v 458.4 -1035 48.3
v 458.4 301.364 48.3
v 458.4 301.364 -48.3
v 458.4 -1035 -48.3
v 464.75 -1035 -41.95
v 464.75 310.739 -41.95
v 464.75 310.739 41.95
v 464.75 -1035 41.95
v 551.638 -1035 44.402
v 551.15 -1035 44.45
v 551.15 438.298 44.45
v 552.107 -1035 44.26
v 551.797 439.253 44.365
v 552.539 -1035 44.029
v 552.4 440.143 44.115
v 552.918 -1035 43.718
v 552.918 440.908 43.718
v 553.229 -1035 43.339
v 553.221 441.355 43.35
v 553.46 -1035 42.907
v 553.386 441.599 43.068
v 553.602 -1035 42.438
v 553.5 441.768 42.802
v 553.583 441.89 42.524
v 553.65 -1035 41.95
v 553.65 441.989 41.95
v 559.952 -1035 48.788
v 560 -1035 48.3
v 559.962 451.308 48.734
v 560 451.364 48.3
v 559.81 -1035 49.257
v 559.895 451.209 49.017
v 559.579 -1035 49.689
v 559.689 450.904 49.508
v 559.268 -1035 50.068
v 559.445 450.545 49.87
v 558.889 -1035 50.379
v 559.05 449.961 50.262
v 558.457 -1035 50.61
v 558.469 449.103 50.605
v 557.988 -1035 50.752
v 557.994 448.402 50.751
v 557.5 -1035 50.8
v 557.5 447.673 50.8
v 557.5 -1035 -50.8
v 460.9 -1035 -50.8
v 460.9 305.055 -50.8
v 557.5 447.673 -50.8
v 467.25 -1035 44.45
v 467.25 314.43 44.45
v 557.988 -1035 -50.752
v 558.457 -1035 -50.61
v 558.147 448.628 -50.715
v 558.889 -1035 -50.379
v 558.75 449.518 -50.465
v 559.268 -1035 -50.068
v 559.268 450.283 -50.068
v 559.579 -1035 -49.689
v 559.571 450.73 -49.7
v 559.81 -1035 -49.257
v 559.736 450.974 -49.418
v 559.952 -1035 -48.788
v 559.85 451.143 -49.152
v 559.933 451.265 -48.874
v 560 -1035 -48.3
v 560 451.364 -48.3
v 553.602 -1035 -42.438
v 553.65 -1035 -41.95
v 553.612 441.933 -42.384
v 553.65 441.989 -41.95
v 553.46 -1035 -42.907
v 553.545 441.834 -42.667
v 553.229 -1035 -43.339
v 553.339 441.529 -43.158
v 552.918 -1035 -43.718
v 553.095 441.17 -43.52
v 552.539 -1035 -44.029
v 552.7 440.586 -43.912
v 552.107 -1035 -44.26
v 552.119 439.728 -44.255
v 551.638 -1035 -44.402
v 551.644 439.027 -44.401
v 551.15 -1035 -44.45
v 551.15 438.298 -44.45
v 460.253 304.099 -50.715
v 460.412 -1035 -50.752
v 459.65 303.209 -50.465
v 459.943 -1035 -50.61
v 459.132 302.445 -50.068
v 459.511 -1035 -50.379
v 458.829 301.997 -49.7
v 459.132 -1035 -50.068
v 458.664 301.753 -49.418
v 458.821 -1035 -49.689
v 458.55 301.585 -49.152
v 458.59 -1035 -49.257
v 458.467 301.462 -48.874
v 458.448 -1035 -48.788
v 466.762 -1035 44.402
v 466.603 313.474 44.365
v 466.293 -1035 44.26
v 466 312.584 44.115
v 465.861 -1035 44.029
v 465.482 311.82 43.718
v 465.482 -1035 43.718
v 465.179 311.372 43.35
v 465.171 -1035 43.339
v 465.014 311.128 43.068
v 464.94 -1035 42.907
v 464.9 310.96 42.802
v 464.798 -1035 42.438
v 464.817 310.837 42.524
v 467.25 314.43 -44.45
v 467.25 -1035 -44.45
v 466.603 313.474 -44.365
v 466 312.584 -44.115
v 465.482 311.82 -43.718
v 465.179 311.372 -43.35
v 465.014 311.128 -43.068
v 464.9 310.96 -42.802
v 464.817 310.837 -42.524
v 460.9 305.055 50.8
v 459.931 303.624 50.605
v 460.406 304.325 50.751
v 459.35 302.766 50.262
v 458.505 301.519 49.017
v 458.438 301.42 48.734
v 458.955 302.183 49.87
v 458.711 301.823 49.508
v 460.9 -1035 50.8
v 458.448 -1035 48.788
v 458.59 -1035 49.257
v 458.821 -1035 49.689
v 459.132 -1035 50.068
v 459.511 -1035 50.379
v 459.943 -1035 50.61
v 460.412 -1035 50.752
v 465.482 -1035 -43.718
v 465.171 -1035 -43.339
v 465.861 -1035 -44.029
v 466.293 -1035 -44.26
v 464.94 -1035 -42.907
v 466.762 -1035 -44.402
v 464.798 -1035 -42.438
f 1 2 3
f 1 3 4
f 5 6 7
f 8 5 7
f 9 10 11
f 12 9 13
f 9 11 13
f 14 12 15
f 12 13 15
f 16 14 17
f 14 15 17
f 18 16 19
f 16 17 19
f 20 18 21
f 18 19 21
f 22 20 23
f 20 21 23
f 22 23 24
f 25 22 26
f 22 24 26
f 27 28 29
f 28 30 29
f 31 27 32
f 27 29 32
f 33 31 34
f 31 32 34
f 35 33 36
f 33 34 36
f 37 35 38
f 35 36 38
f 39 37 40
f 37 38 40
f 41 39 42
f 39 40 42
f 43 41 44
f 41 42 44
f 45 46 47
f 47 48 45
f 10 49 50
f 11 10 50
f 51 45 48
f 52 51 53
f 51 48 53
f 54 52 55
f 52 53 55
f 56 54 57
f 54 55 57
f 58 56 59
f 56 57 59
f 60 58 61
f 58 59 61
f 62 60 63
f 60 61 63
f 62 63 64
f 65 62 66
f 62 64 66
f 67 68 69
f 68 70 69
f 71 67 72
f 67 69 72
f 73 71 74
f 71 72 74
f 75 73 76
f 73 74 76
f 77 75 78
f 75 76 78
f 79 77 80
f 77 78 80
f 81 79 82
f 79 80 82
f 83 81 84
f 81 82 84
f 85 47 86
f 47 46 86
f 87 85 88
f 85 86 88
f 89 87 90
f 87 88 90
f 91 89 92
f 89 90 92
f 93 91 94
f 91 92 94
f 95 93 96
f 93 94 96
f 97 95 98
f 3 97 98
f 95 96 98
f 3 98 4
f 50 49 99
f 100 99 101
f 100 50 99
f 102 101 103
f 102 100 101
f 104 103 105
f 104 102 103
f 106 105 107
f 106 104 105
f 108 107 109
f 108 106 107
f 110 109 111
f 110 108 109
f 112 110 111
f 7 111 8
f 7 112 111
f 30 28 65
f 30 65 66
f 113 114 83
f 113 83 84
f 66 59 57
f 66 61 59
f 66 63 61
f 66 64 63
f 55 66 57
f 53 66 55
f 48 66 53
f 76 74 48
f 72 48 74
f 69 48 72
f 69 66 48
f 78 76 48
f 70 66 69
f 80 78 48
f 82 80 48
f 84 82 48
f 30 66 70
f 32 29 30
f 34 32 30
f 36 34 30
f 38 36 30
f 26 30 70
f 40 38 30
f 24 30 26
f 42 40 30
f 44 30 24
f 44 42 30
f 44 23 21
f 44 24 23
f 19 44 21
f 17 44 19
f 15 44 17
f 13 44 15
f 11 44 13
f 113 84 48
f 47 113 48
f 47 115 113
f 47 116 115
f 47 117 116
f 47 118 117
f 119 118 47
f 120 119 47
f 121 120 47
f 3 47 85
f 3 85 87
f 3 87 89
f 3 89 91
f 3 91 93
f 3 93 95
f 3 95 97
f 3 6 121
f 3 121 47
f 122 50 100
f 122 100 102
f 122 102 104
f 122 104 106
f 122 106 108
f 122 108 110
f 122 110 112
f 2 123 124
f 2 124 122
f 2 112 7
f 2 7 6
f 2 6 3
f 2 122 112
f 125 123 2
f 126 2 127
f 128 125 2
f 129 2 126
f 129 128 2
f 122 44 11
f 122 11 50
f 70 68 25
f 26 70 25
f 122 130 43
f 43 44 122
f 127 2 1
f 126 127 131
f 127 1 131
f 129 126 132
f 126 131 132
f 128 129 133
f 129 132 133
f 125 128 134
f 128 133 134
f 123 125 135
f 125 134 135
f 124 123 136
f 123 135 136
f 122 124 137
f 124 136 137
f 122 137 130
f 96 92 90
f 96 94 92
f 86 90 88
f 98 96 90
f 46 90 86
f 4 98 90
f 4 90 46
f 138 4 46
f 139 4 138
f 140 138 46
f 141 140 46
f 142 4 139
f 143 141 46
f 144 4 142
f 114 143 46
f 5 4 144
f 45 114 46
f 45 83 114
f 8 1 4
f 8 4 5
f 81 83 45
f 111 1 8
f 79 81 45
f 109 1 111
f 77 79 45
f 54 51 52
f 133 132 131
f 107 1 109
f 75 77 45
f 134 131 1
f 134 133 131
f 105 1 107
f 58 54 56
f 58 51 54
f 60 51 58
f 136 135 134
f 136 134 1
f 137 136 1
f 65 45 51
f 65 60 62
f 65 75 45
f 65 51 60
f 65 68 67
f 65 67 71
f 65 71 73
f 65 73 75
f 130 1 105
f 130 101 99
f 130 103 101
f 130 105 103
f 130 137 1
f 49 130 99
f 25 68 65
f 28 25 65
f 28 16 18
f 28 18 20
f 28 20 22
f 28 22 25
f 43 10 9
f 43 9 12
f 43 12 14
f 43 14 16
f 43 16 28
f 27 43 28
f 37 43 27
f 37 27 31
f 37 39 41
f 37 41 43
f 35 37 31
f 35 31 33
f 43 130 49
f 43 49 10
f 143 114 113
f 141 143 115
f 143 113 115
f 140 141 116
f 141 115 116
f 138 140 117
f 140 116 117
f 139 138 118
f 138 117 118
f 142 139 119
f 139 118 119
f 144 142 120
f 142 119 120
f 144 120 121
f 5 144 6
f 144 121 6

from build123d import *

# Parameters (mm, degrees)
F0_W     = 101.6
F0_H     = 376.3636363636
F1_DEPTH = 50.8
F2_W     = 88.9
F2_H     = 88.9
F3_DEPTH = 1476.9896363636
F4_R     = 2.5


with BuildPart() as f1:
    # F0 (on Top) → F1 (new body, symmetric)
    with BuildSketch(Plane.XY):
        Polygon((560, -75), (560, 75), (458.4, -75), (458.4, -658.6363636364), (560, -658.6363636364), align=None)
        Polygon((458.4, -75), (560, 75), (560, 301.3636363636), (560, 451.3636363636), (458.4, 301.3636363636), align=None)
        with Locations((509.2, -846.8181818182)):
            Rectangle(F0_W, F0_H)
    extrude(amount=F1_DEPTH, both=True)

    # F2 (on face) → F3 (cut, through all)
    with BuildSketch(Plane.XZ.offset(1035)):
        with Locations((509.2, 0)):
            Rectangle(F2_W, F2_H)
    extrude(amount=-F3_DEPTH, mode=Mode.SUBTRACT)

    # F4
    f4_edges = [f1.edges().sort_by_distance(p)[0] for p in [
        (560, -291.818182, 50.8),
        (458.4, -366.818182, 50.8),
        (458.4, -366.818182, -50.8),
        (560, -291.818182, -50.8),
        (464.75, -362.130682, 44.45),
        (553.65, -296.505682, 44.45),
        (553.65, -296.505682, -44.45),
        (464.75, -362.130682, -44.45),
    ]]
    fillet(f4_edges, radius=F4_R)


solid = f1.part
